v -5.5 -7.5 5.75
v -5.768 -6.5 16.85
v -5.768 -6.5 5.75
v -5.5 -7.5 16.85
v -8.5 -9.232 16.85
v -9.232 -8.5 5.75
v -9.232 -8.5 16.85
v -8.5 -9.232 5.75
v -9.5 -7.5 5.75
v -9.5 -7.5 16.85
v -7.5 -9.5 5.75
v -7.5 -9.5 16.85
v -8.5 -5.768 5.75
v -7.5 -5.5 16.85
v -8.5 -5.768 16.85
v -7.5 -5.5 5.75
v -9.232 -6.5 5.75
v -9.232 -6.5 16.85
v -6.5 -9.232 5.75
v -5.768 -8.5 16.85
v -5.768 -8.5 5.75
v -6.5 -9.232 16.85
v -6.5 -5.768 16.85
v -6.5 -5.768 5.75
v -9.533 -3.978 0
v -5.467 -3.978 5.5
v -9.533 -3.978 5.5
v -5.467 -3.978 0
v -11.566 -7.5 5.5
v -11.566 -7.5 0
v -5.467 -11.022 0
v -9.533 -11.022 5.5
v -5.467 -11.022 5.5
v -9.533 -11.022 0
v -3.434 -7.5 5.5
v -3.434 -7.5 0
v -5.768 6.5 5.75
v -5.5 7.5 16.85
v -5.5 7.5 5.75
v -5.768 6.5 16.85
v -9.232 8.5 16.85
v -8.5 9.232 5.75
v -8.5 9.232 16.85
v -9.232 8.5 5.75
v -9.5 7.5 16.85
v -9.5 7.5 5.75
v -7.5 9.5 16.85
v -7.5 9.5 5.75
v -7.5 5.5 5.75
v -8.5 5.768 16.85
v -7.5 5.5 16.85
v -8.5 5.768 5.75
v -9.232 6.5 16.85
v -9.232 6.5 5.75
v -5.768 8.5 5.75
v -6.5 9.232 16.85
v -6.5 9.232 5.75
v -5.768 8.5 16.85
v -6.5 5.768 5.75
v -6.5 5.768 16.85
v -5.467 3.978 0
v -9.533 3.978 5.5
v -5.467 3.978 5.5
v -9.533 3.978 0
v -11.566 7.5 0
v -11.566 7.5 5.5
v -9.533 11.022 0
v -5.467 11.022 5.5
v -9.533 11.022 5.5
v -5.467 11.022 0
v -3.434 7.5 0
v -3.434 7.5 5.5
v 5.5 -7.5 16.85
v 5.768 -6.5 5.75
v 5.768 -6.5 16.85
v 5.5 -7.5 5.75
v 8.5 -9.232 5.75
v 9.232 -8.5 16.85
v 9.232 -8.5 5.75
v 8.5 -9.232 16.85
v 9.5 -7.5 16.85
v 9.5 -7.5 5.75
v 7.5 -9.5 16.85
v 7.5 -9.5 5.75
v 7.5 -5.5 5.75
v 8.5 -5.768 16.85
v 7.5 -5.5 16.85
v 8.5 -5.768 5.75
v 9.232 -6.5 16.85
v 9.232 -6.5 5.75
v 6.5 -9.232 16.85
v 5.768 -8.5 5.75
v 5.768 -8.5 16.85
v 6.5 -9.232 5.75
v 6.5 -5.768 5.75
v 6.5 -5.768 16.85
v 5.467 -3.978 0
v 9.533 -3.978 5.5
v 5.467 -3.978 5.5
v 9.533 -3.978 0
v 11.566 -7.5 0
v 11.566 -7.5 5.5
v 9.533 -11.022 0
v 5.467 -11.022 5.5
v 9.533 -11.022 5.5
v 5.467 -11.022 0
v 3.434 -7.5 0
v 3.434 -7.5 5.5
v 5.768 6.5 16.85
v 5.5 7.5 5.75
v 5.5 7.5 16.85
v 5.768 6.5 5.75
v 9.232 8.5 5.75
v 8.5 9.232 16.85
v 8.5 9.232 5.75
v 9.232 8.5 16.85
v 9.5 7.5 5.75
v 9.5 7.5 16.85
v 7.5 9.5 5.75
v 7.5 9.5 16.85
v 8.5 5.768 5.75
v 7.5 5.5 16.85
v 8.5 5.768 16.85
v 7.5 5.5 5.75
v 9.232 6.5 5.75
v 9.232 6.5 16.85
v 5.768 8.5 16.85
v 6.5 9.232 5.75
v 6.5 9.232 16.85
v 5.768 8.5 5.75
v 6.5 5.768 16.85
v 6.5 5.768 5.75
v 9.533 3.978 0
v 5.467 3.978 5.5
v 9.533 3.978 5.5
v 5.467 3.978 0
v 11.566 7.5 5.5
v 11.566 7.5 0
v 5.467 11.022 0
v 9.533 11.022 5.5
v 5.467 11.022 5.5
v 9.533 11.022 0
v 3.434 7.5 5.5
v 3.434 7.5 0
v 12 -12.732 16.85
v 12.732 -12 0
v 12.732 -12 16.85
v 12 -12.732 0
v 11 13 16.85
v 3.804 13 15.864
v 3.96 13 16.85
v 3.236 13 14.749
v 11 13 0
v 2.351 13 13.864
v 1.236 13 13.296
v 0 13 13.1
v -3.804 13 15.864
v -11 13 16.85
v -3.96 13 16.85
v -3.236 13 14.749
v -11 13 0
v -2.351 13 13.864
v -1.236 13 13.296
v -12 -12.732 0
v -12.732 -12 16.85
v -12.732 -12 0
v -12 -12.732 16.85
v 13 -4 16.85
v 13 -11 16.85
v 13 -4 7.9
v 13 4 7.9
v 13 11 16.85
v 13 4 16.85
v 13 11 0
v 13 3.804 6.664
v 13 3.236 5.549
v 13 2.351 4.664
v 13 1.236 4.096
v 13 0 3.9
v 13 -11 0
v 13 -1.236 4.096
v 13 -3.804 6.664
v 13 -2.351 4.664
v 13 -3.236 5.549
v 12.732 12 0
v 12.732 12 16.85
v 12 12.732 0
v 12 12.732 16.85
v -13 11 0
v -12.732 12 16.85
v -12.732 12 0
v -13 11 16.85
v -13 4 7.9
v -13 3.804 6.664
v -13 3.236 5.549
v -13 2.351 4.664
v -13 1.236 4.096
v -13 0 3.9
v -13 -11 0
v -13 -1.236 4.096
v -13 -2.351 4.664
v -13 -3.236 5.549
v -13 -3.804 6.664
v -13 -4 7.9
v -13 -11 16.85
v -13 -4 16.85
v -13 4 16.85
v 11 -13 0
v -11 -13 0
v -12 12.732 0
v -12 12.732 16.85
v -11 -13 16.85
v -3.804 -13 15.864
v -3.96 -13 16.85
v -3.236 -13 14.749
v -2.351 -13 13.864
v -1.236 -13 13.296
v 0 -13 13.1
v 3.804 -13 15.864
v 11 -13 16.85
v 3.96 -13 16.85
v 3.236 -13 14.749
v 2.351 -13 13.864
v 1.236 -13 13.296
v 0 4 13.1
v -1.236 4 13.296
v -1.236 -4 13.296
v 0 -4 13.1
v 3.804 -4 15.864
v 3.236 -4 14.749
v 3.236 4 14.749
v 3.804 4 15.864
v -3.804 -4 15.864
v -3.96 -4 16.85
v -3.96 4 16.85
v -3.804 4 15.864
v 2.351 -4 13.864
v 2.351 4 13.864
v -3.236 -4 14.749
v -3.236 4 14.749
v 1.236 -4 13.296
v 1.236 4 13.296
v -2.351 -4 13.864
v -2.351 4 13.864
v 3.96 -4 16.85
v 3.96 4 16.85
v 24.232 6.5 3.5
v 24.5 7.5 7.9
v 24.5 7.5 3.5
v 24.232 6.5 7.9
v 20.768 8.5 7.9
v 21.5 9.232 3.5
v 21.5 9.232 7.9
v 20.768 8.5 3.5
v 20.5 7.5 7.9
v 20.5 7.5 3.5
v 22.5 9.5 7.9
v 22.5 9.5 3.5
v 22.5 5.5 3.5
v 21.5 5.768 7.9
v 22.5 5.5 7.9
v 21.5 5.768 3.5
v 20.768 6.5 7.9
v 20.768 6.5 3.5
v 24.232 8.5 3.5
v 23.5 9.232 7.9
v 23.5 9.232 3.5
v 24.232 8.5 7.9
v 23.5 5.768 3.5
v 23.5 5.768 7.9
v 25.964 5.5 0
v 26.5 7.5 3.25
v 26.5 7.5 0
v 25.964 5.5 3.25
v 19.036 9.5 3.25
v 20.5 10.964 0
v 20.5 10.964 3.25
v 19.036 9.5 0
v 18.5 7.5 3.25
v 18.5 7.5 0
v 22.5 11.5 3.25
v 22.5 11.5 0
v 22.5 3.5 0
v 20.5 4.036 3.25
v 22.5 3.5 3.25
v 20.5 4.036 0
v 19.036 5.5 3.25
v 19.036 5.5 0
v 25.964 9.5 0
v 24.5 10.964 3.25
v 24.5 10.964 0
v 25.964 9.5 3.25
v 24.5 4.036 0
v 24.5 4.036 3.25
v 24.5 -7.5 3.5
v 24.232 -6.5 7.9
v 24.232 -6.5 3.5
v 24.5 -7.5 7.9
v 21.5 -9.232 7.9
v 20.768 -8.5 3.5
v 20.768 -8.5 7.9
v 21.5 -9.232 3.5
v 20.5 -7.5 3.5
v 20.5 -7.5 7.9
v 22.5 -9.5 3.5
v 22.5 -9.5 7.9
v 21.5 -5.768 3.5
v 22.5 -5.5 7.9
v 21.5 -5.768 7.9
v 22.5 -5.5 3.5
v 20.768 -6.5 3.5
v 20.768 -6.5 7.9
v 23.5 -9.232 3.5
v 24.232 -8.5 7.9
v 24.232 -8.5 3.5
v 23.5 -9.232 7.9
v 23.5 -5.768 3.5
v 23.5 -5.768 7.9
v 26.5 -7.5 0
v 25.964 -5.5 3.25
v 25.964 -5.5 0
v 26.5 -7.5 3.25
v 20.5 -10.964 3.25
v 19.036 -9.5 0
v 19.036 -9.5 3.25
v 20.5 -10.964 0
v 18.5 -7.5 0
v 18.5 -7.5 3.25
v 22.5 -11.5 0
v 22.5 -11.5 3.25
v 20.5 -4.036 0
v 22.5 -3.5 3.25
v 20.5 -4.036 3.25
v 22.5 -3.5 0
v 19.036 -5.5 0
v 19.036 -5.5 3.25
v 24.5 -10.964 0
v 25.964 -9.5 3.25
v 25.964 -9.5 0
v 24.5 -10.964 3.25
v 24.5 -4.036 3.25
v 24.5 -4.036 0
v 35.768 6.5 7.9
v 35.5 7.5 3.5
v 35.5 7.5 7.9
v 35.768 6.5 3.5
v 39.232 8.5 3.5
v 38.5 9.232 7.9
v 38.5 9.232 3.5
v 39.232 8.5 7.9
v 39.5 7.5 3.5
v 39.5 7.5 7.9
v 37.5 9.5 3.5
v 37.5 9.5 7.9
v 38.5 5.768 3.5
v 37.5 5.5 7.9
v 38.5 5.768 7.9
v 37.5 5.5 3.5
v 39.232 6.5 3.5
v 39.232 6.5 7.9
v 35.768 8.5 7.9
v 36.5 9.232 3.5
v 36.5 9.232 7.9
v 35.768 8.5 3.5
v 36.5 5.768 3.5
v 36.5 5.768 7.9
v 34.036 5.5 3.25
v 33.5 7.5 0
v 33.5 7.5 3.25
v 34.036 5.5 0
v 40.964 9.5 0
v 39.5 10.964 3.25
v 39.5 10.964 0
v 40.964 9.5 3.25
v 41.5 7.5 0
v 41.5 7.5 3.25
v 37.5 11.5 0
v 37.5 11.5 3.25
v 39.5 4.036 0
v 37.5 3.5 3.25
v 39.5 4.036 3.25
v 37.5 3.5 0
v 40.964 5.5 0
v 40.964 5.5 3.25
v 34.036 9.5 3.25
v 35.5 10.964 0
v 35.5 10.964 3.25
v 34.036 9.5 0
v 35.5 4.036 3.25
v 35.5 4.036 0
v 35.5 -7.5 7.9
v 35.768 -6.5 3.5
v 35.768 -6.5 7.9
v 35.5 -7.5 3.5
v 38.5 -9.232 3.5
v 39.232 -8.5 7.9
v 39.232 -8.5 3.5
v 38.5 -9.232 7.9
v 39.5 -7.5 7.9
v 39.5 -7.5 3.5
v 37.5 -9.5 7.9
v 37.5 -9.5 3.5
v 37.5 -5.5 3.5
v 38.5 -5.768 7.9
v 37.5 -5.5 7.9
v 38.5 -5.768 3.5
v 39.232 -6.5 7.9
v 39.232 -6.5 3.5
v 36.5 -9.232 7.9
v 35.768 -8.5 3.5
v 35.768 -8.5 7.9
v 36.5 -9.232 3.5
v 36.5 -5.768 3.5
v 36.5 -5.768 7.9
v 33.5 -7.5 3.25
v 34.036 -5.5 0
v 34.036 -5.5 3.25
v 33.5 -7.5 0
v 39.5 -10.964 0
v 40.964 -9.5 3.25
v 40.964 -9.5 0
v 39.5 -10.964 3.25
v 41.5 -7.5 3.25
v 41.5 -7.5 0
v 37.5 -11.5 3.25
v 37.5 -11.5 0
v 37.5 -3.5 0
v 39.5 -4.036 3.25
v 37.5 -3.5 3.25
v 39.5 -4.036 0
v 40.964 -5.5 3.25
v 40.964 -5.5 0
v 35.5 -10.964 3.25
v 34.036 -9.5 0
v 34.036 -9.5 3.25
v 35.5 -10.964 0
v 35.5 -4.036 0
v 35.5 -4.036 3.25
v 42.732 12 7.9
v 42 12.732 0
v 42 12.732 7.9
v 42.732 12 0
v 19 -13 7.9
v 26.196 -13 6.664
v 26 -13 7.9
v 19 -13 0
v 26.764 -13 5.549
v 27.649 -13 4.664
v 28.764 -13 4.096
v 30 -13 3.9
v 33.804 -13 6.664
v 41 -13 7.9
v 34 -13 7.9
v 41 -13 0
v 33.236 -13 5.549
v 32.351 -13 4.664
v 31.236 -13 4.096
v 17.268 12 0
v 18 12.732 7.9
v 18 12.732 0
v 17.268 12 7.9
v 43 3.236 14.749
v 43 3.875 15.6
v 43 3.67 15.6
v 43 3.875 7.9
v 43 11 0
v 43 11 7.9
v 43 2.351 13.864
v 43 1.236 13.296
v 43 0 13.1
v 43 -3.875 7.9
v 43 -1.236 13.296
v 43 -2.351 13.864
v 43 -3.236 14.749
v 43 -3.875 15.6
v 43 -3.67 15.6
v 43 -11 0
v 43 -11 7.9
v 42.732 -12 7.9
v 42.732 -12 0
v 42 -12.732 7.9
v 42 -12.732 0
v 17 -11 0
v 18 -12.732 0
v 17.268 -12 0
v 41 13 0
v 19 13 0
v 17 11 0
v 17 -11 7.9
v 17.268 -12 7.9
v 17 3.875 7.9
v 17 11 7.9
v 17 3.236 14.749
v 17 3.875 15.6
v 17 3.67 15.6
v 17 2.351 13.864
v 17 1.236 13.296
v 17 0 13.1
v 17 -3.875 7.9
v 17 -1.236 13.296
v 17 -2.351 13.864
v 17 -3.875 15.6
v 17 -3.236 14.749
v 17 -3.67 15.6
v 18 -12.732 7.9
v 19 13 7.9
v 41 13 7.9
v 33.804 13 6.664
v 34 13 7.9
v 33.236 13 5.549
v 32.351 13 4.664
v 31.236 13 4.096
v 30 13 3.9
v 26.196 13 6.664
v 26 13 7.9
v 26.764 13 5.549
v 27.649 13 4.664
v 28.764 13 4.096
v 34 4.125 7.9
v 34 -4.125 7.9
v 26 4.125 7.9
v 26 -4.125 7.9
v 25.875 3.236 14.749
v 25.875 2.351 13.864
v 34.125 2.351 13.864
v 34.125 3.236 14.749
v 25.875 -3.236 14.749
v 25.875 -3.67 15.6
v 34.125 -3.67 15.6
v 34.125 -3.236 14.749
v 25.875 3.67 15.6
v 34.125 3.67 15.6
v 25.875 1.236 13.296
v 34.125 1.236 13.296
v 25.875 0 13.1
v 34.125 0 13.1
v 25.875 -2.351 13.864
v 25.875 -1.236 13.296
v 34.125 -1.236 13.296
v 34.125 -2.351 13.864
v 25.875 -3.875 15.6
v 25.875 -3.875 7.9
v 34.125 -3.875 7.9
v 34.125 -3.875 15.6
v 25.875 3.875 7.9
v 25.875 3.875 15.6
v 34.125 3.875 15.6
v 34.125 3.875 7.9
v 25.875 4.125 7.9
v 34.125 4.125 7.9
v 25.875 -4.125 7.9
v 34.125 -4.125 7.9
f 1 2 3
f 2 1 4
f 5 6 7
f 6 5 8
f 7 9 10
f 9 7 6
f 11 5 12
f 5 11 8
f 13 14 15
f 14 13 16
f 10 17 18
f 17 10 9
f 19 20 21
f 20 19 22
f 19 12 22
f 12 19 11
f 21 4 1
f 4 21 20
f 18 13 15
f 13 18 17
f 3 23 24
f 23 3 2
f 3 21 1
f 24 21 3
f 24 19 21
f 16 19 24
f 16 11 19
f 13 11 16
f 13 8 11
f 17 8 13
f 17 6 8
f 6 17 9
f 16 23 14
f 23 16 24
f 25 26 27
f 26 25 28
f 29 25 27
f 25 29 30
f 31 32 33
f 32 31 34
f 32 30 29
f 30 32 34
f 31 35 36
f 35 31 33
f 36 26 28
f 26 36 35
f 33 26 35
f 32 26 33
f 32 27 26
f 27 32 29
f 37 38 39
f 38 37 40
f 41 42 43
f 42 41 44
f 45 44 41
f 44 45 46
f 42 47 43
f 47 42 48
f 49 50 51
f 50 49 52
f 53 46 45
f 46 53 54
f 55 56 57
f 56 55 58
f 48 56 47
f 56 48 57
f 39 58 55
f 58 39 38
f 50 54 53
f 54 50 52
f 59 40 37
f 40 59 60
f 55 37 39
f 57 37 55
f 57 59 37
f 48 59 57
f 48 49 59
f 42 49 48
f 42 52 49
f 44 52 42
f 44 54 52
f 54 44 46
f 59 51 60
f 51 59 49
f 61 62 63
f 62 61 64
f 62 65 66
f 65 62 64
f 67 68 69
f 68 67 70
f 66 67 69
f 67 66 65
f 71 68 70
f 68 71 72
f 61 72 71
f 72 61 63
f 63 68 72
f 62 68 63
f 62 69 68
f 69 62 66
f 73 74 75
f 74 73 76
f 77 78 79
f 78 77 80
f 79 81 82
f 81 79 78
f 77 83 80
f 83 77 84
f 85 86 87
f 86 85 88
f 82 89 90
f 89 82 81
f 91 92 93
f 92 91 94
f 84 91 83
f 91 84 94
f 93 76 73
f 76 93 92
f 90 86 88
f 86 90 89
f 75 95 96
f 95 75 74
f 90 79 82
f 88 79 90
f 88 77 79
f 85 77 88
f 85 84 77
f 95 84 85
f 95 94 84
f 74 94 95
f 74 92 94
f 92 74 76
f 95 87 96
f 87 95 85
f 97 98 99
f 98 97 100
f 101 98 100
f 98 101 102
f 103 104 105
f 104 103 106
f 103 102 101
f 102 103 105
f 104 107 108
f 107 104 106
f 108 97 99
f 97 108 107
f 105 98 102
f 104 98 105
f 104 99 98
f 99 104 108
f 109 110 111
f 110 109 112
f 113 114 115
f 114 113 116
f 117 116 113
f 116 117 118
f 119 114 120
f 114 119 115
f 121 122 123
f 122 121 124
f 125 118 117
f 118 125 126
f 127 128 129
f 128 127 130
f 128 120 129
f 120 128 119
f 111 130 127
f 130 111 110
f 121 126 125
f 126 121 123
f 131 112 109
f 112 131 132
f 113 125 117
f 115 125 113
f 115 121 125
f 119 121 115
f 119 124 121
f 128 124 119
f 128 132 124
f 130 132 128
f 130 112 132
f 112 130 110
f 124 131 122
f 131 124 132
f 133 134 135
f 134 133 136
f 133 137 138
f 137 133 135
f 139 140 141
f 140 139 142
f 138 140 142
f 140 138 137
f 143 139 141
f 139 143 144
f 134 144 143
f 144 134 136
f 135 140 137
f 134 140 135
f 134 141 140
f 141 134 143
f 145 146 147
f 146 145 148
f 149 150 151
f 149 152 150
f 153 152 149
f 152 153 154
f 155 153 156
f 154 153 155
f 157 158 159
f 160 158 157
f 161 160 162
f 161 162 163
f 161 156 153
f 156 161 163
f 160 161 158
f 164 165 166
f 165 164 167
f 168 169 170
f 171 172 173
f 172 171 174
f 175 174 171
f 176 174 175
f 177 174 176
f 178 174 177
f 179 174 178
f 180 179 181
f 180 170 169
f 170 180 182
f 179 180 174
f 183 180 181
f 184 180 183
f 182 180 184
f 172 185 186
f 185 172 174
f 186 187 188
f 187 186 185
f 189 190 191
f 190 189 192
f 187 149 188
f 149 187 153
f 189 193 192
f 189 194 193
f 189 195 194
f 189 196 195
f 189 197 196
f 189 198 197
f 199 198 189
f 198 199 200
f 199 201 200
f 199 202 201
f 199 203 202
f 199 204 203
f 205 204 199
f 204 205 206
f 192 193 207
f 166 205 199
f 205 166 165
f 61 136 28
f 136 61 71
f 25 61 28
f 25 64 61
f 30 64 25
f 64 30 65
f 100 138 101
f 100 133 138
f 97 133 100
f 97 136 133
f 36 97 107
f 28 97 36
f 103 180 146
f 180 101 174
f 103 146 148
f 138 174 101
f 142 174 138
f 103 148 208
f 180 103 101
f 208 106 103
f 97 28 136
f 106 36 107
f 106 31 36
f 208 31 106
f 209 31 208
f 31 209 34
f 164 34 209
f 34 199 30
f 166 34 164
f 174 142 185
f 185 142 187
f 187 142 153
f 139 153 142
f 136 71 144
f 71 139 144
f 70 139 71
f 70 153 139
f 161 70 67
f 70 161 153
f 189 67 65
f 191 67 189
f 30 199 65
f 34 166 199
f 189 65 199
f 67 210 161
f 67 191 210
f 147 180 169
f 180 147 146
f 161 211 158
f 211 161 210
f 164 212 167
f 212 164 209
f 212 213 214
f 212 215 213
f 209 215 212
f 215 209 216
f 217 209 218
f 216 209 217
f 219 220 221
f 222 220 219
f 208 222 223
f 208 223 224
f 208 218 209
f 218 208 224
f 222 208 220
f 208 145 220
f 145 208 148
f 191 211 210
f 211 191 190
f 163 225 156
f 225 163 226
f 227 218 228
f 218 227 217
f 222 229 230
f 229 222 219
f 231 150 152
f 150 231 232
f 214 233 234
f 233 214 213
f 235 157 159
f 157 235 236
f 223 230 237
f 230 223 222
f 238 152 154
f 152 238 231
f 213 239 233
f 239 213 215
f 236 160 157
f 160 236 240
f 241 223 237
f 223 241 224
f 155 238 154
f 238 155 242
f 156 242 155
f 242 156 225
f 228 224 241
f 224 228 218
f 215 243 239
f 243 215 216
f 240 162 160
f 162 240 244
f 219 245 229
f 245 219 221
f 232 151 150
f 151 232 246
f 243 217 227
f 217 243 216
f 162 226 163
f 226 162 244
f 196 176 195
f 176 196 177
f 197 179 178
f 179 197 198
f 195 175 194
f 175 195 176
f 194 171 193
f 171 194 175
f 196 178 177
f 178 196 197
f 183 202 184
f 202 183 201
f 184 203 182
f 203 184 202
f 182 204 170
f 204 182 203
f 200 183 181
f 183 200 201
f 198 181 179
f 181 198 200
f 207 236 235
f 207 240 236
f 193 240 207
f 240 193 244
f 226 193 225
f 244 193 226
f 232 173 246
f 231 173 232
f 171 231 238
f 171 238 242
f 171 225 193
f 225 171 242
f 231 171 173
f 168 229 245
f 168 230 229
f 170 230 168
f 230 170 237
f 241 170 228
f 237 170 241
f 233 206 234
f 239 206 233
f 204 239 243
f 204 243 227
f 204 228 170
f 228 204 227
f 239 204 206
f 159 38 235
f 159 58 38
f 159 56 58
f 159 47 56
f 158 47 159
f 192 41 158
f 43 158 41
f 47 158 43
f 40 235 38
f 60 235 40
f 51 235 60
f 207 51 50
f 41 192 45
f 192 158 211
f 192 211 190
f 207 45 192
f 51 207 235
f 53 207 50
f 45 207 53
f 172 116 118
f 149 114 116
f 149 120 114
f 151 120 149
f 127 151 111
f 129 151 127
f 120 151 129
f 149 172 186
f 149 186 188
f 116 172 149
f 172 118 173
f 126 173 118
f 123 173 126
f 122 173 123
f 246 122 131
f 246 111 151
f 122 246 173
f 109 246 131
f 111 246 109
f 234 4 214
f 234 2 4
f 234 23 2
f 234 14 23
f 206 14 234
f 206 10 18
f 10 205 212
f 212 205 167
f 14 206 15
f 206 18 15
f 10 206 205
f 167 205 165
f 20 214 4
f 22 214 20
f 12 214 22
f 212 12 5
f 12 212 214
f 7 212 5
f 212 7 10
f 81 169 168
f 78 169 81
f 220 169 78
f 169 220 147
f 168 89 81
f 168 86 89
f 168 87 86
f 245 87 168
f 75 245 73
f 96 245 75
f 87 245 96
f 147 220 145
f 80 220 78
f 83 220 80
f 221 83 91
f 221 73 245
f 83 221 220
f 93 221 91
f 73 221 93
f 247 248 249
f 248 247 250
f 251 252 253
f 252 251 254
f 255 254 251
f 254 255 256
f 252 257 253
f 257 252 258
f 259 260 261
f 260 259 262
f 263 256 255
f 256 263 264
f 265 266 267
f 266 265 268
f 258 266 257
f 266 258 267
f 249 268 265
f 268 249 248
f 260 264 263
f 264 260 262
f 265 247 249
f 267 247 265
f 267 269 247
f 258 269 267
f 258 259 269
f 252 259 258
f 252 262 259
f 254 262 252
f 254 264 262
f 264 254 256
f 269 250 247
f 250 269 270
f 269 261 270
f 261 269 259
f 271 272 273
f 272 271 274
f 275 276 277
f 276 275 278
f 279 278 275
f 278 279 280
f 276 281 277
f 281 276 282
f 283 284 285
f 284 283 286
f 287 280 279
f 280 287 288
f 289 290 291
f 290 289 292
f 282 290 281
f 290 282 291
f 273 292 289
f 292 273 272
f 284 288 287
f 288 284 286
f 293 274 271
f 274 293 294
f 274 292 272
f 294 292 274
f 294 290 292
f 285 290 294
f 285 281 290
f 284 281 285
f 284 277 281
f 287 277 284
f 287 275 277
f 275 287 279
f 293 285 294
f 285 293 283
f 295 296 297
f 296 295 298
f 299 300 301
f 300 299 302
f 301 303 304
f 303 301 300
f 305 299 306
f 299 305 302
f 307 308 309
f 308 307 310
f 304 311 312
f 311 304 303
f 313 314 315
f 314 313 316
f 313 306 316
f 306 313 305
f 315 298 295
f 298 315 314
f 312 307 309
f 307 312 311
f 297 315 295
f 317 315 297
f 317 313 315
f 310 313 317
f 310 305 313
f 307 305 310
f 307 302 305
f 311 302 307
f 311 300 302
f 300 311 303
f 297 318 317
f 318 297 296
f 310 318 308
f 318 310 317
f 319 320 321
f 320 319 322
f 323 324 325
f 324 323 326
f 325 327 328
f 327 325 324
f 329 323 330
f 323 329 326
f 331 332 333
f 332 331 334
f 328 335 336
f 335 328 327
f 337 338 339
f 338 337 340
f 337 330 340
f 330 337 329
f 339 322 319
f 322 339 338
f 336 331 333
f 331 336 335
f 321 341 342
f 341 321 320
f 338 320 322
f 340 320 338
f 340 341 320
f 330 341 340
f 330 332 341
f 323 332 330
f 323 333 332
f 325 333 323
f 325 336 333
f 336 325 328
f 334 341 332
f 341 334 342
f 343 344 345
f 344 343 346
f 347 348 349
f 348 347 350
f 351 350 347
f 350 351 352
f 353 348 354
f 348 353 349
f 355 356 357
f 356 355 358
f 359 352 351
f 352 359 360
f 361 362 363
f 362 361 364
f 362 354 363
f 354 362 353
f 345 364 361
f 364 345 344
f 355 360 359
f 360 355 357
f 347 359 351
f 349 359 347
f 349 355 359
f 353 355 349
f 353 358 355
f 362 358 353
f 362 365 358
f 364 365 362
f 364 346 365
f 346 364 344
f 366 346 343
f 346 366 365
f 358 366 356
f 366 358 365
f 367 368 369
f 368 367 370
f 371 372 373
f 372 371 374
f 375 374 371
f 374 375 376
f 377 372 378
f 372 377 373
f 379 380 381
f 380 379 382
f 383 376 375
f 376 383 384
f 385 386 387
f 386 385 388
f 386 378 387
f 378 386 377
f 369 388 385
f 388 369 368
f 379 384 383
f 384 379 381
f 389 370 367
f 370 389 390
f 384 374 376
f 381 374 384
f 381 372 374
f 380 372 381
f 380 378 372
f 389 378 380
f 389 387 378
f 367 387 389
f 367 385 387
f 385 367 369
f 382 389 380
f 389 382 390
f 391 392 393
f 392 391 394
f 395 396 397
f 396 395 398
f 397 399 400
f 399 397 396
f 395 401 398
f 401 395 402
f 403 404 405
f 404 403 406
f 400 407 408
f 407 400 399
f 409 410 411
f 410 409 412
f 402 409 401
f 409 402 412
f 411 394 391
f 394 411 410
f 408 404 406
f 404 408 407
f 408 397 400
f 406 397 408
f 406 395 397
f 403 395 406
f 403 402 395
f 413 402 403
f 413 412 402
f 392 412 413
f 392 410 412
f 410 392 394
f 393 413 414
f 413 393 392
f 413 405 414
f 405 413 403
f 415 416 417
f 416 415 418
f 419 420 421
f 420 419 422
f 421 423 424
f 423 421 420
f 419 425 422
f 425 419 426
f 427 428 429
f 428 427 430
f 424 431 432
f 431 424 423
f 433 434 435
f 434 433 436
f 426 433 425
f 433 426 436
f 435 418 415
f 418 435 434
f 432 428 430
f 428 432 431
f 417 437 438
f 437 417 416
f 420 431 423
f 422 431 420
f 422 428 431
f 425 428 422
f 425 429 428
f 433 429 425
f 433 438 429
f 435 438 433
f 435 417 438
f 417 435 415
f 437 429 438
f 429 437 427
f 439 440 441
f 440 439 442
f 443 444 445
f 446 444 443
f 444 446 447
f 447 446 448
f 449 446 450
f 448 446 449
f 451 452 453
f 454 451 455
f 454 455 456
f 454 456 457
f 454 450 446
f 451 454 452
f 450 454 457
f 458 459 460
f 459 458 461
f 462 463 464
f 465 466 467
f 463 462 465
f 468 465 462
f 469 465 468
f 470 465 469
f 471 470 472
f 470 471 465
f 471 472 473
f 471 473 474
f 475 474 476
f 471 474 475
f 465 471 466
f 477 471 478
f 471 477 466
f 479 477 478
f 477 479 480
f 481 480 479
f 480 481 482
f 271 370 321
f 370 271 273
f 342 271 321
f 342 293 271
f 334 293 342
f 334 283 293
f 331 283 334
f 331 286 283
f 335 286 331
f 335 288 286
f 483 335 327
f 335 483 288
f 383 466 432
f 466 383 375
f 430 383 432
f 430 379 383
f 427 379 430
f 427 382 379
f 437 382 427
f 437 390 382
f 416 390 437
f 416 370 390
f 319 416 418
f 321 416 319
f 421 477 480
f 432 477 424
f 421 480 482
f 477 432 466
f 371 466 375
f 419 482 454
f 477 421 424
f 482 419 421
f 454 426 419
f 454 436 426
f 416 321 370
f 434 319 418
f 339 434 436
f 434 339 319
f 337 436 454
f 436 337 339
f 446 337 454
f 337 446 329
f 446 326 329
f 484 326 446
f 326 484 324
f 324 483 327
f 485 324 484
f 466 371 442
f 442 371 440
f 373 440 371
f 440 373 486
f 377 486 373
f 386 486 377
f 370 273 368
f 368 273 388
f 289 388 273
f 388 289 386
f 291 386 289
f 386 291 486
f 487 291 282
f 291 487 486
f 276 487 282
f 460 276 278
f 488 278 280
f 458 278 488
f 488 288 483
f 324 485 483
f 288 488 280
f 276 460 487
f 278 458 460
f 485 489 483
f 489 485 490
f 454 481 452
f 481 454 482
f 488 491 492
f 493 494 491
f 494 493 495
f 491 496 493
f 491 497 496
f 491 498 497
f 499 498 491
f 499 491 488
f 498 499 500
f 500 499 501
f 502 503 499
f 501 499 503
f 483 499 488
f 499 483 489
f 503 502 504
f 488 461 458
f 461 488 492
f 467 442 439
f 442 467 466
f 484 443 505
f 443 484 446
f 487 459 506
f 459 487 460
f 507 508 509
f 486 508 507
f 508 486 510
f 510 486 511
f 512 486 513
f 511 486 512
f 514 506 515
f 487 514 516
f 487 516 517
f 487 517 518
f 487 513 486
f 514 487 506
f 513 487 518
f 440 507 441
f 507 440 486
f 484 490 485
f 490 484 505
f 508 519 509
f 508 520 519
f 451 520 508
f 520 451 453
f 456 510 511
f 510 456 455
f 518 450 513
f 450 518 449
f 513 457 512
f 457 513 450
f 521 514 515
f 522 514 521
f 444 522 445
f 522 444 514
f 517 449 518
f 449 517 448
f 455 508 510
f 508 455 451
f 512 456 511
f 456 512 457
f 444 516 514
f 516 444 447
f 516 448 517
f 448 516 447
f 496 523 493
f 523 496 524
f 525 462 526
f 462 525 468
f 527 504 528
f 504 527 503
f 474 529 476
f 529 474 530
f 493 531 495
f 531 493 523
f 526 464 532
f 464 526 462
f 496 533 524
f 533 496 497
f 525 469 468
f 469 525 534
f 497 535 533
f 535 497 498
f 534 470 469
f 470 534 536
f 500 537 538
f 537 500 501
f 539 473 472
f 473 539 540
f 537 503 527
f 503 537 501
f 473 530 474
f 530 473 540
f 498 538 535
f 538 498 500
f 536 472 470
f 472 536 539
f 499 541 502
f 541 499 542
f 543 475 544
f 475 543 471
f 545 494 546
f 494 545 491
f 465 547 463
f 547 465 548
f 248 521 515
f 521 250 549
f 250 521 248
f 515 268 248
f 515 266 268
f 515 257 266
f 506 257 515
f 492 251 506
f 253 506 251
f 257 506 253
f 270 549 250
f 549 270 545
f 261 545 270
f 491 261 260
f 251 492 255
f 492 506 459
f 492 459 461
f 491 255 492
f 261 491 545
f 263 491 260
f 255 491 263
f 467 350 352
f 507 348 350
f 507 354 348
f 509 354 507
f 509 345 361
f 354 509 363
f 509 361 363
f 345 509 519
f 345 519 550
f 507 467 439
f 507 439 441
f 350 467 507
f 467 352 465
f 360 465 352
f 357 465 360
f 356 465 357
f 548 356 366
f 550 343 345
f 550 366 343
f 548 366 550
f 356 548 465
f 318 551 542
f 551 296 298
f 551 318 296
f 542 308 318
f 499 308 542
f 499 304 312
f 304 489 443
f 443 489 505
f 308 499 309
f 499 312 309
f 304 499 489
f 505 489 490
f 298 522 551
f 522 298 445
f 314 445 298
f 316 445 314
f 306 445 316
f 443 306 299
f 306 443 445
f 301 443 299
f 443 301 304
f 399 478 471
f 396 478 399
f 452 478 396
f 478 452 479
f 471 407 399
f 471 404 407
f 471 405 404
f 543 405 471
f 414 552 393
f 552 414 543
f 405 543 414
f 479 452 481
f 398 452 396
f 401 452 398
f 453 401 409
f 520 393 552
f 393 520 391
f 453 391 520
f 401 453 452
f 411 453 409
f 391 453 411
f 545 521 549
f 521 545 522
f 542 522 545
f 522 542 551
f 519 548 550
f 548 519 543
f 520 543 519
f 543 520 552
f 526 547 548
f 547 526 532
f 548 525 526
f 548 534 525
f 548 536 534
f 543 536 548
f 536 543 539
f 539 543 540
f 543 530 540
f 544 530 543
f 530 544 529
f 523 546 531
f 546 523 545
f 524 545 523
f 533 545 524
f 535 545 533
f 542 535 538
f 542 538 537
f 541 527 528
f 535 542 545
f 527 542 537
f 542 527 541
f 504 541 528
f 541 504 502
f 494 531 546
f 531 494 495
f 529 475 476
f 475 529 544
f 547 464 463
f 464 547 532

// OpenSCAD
// file: configuration.scad
//
// RepRap Mendel Akimbo
//
// A Mendel variant, which improves the frame's clearance and stability
//  by increasing it's triangulation.
//
// Copyright 2012 by Ron Aldrich.
//
// Licensed under GNU GPL v2
//
//	configuration.scad
//
//	General configuration settings.
//
//	Because this file is intended to be somewhat interchangable with 
//		configuration.scad from prusajr's github repository, there is 
//		more configuration in "moreConfiguration.scad".
//
//  Only the metric variant is tested. Other variants are not supported, and will most likely
//    create unworkable parts.
//
//	Edit layer_height to be greater than the height of one printed layer, 
//		but less than the height of two printed layers.
//


metric = 0;	// All parts are metric - use both M3 and M4 bolts.
sae = 1;		// All parts are SAE - use only #6/32 bolts.
m3only = 2;	// All parts are metric, but use only M3 bolts.
hybrid = 3;	// Mix of metric and SAE - use M3 and 6/32 bolts.

variant = metric;

layer_height = .25;

nut_slop = .2;		// I aim for a "interference fit" for nuts - a bit of force required to place the nut.

bolt_slop = .6;	// The aim here is to just barely allow the bolt to fit through the hole, without having to thread it in.

_actual_m3_diameter = 3+bolt_slop;
_actual_m4_diameter = 4+bolt_slop;
_actual_6_32_diameter = 3.4+bolt_slop;

_actual_m3_nut_diameter = 5.5/cos(30)+nut_slop;
_actual_m4_nut_diameter = 6.87/cos(30)+nut_slop;
_actual_m5_nut_diameter = 7.85/cos(30)+nut_slop;
_actual_6_32_nut_diameter = 7.85/cos(30)+nut_slop;

_m3_diameters = [_actual_m3_diameter, _actual_6_32_diameter, _actual_m3_diameter, _actual_m3_diameter];
_m3_nut_diameters = [_actual_m3_nut_diameter, _actual_6_32_nut_diameter, _actual_m3_nut_diameter, _actual_m3_nut_diameter];

_m4_diameters = [_actual_m4_diameter, _actual_6_32_diameter, _actual_m3_diameter, _actual_6_32_diameter];
_m4_nut_diameters = [_actual_m4_nut_diameter, _actual_6_32_nut_diameter, _actual_m3_nut_diameter, _actual_6_32_nut_diameter];

m3_diameter = _m3_diameters[variant];
m3_nut_diameter = _m3_nut_diameters[variant];

m4_diameter = _m4_diameters[variant];
m4_nut_diameter = _m4_nut_diameters[variant];

m5_diameter = 5+bolt_slop;
m5_nut_diameter = _actual_m5_nut_diameter;
m5_bolt_head_height = 4;

m6_diameter = 6+bolt_slop;
m6_nut_diameter = 10/cos(30)+nut_slop;
m6_bolt_head_height = 4;

m8_diameter = 8;

m8_nut_diameter = 12.8/cos(30)+nut_slop;
m8_nut_thickness = 7.7;
m8_bolt_head_height = 6;
m8_half_nut_height = 3.85;

threaded_rod_diameter = 8.7;

actual_smooth_rod_diameter = 8;
smooth_rod_diameter = actual_smooth_rod_diameter+.25;
// file: more_configuration.scad
//
// RepRap Mendel Akimbo
//
// A Mendel variant, which improves the frame's clearance and stability
//  by increasing it's triangulation.
//
// Copyright 2012 by Ron Aldrich.
//
// Licensed under GNU GPL v2
//
// moreConfiguration.scad
//
//	General configuration settings that didn't exist in prusajr's configuration.scad
//
//	These settings are here, rather than in configuration.scad, in
//		order to keep configuration.scad interchangable with prusajr.s version.
//
// Edit extrusion_width to be greater than the width of one shell, but less than the width of two shells.

include <configuration.scad>

extrusion_width = .6;

vertical_slop = .6;
horizontal_slop = .3;

_actual_m3_nut_thickness = 2.5;
_actual_m4_nut_thickness = 3.5;
_actual_6_32_nut_thickness = 3.25;

_m3_nut_thickness = [_actual_m3_nut_thickness, _actual_6_32_nut_thickness, _actual_m3_nut_thickness, _actual_m3_nut_thickness];

_m4_nut_thickness = [_actual_m4_nut_thickness, _actual_6_32_nut_thickness, _actual_m3_nut_thickness, _actual_6_32_nut_thickness];

m3_nut_thickness = _m3_nut_thickness[variant];
m3_washer_diameter = 7.5;

m4_nut_thickness = _m4_nut_thickness[variant];

m3_bolt_head_height = 3;
m3_bolt_head_diameter = 6+horizontal_slop;

m4_bolt_head_height = 4;
m4_bolt_head_diameter = 7+horizontal_slop;

// Don't edit things after here.

x = 0;
y = 1;
z = 2;

bearing_length = 0;
bearing_body_diameter = 1;
bearing_flange_diameter = 2;
bearing_flange_width = 3;
bearing_rod_diameter = 4;

// linear_roller_bearing = [2, 6, 6, 0, 3];

683_bearing = [3, 7, 7, 0, 3];
683_bearing_clearance = [0.4, 0.4, 0.4, 0, 2];

623_bearing = [4, 10, 10, 0, 6];
623_bearing_clearance = [0.4, 0.4, 0.4, 0, 2];

624_bearing = [5, 13, 13, 0, 4];
624_bearing_clearance = [0.4, 0.4, 0.4, 0, 2];

608_bearing = [7, 22, 22, 0, 8];
608_bearing_clearance = [0.4, 0.4, 0.4, 0, 2];

115_bearing = [4, 11, 11, 0, 5];
115_bearing_clearance = [0.4, 0.4, 0.4, 0, 3];

106_bearing = [3, 10, 10, 0, 6];
106_bearing_clearance = [0.4, 0.4, 0.4, 0, 0];

126_bearing = [4, 12, 12, 0, 6];
126_bearing_clearance = [0.4, 0.4, 0.4, 0, 3];

128_bearing = [3.5, 12, 12, 0, 8];
128_bearing_clearance = [0.4, 0.4, 0.4, 4];

lm8uu = [24, 15, 15, 0, 8];
lm8uu_clearance = [0.4, 0.4, 0.4, 0, 0];

igus = [10, 10, 15, 1, 8];
igus_clearance = [0.4, 0.4, 0.4, 0.4, 0];

part_color_1 = [1, .9, 0];
part_color_2 = [.9, 1, 0];

wood_color_1 = [111/256, 78/256, 55/256];
wood_color_2 = wood_color_1+[.2, .2, .2];
wood_color_3 = wood_color_1-[.2, .2, .2];

nema17_hole_spacing = 1.25*25.4;

ramps_size = [102, 60];

ramps_mounts = [[-35.76, -20.86],
                [-35.76, 27.4],
                [39.17, 27.4],
                [45.52, -20.86]];

//echo(ramps_mounts);
// main file
include <more_configuration.scad>

print_orientation = true;

h_slop = .25;

bar_separation = 9.2;

clamp_size = [26, 26, 25];
clamp_center = [0, 0, clamp_size[z]/2];
bar1_center = clamp_center+[0, 0, bar_separation/2];
bar2_center = clamp_center-[0, 0, bar_separation/2];

nut_trap_depth = 5.5;
screw_head_depth = 3.25;

screw_center = [7.5, 7.5, 0];

clamp_bottom = [0, 0, 0];
clamp_top = [0, 0, clamp_size[z]];

function centerof(a, b) = [(a[x]+b[x])/2, (a[y]+b[y])/2, (a[z]+b[z])/2];

function barclamp_size() = clamp_size;

module barclamp_solid()
{
	s1 = [0, 0, nut_trap_depth];
	s2 = [0, 0, clamp_size[z]-screw_head_depth];

	difference()
	{
		translate(clamp_center)
		minkowski()
		{
			cube(clamp_size-[4, 4, 4], center=true);
			cylinder(h=4, r=2, $fn=12, center=true);
		}

		translate(bar1_center)
		rotate([90, 0, 0])
		cylinder(h=clamp_size[y]+.1, r=4, $fn=20, center=true);

		translate(bar2_center)
		rotate([0, 90, 0])
		cylinder(h=clamp_size[x]+.1, r=4, $fn=20, center=true);

		for(i=[-1, 1]) for(j=[-1, 1]) scale([i, j, 1]) translate(screw_center)
		{
			translate(centerof(s1, s2))
			cylinder(h=s2[z]-s1[z]-2*layer_height, r=2, $fn=12, center=true);

			translate(centerof([0, 0, 0], s1) - [0, 0, .05])
			cylinder(h=nut_trap_depth+.1, r=m4_nut_diameter/2, $fn=6, center=true);

			translate(centerof([0, 0, clamp_size[z]], s2) + [0, 0, .05])
			cylinder(h=screw_head_depth+.1, r=8/2, $fn=12, center=true);
		}
	}
}

module barclamp_void()
{
	compression_slop = .25;

	translate(centerof(bar2_center, clamp_top)+[0, 0, .05])
	cube([clamp_size[x]+.1, 8, clamp_top[z]-bar2_center[z]+.1], center=true);

	translate(centerof(bar1_center-[0, 0, compression_slop], clamp_top)+[0, 0, .05])
	cube([clamp_size[x]+.1, clamp_size[y]+.1, clamp_top[z]-bar1_center[z]+compression_slop+.1], center=true);
}

module barclamp_top()
{
	difference()
	{
		union()
		{
			translate(centerof(bar2_center, clamp_top)+[0, 0, .05])
			cube([clamp_size[x]+.1, 8-h_slop, clamp_top[z]-bar2_center[z]+.1], center=true);

			translate(centerof(bar1_center, clamp_top)+[0, 0, .05])
			cube([clamp_size[x]+.1, clamp_size[y]+.1, clamp_top[z]-bar1_center[z]+.1], center=true);
		}

		translate(clamp_center)
		cube([8+h_slop, 8+h_slop, bar_separation], center=true);

		translate(bar2_center)
		cube([clamp_size[x]+.1, clamp_size[y]+.1, 3], center=true);
	}
}

module barclamp(print_orientation=print_orientation)
{
	difference()
	{
		barclamp_solid();
		barclamp_void();
	}

	translate([30, 0, clamp_size[z]])
	rotate([180, 0, 0])
	intersection()
	{
		barclamp_solid();
		barclamp_top();
	}
}

barclamp();
